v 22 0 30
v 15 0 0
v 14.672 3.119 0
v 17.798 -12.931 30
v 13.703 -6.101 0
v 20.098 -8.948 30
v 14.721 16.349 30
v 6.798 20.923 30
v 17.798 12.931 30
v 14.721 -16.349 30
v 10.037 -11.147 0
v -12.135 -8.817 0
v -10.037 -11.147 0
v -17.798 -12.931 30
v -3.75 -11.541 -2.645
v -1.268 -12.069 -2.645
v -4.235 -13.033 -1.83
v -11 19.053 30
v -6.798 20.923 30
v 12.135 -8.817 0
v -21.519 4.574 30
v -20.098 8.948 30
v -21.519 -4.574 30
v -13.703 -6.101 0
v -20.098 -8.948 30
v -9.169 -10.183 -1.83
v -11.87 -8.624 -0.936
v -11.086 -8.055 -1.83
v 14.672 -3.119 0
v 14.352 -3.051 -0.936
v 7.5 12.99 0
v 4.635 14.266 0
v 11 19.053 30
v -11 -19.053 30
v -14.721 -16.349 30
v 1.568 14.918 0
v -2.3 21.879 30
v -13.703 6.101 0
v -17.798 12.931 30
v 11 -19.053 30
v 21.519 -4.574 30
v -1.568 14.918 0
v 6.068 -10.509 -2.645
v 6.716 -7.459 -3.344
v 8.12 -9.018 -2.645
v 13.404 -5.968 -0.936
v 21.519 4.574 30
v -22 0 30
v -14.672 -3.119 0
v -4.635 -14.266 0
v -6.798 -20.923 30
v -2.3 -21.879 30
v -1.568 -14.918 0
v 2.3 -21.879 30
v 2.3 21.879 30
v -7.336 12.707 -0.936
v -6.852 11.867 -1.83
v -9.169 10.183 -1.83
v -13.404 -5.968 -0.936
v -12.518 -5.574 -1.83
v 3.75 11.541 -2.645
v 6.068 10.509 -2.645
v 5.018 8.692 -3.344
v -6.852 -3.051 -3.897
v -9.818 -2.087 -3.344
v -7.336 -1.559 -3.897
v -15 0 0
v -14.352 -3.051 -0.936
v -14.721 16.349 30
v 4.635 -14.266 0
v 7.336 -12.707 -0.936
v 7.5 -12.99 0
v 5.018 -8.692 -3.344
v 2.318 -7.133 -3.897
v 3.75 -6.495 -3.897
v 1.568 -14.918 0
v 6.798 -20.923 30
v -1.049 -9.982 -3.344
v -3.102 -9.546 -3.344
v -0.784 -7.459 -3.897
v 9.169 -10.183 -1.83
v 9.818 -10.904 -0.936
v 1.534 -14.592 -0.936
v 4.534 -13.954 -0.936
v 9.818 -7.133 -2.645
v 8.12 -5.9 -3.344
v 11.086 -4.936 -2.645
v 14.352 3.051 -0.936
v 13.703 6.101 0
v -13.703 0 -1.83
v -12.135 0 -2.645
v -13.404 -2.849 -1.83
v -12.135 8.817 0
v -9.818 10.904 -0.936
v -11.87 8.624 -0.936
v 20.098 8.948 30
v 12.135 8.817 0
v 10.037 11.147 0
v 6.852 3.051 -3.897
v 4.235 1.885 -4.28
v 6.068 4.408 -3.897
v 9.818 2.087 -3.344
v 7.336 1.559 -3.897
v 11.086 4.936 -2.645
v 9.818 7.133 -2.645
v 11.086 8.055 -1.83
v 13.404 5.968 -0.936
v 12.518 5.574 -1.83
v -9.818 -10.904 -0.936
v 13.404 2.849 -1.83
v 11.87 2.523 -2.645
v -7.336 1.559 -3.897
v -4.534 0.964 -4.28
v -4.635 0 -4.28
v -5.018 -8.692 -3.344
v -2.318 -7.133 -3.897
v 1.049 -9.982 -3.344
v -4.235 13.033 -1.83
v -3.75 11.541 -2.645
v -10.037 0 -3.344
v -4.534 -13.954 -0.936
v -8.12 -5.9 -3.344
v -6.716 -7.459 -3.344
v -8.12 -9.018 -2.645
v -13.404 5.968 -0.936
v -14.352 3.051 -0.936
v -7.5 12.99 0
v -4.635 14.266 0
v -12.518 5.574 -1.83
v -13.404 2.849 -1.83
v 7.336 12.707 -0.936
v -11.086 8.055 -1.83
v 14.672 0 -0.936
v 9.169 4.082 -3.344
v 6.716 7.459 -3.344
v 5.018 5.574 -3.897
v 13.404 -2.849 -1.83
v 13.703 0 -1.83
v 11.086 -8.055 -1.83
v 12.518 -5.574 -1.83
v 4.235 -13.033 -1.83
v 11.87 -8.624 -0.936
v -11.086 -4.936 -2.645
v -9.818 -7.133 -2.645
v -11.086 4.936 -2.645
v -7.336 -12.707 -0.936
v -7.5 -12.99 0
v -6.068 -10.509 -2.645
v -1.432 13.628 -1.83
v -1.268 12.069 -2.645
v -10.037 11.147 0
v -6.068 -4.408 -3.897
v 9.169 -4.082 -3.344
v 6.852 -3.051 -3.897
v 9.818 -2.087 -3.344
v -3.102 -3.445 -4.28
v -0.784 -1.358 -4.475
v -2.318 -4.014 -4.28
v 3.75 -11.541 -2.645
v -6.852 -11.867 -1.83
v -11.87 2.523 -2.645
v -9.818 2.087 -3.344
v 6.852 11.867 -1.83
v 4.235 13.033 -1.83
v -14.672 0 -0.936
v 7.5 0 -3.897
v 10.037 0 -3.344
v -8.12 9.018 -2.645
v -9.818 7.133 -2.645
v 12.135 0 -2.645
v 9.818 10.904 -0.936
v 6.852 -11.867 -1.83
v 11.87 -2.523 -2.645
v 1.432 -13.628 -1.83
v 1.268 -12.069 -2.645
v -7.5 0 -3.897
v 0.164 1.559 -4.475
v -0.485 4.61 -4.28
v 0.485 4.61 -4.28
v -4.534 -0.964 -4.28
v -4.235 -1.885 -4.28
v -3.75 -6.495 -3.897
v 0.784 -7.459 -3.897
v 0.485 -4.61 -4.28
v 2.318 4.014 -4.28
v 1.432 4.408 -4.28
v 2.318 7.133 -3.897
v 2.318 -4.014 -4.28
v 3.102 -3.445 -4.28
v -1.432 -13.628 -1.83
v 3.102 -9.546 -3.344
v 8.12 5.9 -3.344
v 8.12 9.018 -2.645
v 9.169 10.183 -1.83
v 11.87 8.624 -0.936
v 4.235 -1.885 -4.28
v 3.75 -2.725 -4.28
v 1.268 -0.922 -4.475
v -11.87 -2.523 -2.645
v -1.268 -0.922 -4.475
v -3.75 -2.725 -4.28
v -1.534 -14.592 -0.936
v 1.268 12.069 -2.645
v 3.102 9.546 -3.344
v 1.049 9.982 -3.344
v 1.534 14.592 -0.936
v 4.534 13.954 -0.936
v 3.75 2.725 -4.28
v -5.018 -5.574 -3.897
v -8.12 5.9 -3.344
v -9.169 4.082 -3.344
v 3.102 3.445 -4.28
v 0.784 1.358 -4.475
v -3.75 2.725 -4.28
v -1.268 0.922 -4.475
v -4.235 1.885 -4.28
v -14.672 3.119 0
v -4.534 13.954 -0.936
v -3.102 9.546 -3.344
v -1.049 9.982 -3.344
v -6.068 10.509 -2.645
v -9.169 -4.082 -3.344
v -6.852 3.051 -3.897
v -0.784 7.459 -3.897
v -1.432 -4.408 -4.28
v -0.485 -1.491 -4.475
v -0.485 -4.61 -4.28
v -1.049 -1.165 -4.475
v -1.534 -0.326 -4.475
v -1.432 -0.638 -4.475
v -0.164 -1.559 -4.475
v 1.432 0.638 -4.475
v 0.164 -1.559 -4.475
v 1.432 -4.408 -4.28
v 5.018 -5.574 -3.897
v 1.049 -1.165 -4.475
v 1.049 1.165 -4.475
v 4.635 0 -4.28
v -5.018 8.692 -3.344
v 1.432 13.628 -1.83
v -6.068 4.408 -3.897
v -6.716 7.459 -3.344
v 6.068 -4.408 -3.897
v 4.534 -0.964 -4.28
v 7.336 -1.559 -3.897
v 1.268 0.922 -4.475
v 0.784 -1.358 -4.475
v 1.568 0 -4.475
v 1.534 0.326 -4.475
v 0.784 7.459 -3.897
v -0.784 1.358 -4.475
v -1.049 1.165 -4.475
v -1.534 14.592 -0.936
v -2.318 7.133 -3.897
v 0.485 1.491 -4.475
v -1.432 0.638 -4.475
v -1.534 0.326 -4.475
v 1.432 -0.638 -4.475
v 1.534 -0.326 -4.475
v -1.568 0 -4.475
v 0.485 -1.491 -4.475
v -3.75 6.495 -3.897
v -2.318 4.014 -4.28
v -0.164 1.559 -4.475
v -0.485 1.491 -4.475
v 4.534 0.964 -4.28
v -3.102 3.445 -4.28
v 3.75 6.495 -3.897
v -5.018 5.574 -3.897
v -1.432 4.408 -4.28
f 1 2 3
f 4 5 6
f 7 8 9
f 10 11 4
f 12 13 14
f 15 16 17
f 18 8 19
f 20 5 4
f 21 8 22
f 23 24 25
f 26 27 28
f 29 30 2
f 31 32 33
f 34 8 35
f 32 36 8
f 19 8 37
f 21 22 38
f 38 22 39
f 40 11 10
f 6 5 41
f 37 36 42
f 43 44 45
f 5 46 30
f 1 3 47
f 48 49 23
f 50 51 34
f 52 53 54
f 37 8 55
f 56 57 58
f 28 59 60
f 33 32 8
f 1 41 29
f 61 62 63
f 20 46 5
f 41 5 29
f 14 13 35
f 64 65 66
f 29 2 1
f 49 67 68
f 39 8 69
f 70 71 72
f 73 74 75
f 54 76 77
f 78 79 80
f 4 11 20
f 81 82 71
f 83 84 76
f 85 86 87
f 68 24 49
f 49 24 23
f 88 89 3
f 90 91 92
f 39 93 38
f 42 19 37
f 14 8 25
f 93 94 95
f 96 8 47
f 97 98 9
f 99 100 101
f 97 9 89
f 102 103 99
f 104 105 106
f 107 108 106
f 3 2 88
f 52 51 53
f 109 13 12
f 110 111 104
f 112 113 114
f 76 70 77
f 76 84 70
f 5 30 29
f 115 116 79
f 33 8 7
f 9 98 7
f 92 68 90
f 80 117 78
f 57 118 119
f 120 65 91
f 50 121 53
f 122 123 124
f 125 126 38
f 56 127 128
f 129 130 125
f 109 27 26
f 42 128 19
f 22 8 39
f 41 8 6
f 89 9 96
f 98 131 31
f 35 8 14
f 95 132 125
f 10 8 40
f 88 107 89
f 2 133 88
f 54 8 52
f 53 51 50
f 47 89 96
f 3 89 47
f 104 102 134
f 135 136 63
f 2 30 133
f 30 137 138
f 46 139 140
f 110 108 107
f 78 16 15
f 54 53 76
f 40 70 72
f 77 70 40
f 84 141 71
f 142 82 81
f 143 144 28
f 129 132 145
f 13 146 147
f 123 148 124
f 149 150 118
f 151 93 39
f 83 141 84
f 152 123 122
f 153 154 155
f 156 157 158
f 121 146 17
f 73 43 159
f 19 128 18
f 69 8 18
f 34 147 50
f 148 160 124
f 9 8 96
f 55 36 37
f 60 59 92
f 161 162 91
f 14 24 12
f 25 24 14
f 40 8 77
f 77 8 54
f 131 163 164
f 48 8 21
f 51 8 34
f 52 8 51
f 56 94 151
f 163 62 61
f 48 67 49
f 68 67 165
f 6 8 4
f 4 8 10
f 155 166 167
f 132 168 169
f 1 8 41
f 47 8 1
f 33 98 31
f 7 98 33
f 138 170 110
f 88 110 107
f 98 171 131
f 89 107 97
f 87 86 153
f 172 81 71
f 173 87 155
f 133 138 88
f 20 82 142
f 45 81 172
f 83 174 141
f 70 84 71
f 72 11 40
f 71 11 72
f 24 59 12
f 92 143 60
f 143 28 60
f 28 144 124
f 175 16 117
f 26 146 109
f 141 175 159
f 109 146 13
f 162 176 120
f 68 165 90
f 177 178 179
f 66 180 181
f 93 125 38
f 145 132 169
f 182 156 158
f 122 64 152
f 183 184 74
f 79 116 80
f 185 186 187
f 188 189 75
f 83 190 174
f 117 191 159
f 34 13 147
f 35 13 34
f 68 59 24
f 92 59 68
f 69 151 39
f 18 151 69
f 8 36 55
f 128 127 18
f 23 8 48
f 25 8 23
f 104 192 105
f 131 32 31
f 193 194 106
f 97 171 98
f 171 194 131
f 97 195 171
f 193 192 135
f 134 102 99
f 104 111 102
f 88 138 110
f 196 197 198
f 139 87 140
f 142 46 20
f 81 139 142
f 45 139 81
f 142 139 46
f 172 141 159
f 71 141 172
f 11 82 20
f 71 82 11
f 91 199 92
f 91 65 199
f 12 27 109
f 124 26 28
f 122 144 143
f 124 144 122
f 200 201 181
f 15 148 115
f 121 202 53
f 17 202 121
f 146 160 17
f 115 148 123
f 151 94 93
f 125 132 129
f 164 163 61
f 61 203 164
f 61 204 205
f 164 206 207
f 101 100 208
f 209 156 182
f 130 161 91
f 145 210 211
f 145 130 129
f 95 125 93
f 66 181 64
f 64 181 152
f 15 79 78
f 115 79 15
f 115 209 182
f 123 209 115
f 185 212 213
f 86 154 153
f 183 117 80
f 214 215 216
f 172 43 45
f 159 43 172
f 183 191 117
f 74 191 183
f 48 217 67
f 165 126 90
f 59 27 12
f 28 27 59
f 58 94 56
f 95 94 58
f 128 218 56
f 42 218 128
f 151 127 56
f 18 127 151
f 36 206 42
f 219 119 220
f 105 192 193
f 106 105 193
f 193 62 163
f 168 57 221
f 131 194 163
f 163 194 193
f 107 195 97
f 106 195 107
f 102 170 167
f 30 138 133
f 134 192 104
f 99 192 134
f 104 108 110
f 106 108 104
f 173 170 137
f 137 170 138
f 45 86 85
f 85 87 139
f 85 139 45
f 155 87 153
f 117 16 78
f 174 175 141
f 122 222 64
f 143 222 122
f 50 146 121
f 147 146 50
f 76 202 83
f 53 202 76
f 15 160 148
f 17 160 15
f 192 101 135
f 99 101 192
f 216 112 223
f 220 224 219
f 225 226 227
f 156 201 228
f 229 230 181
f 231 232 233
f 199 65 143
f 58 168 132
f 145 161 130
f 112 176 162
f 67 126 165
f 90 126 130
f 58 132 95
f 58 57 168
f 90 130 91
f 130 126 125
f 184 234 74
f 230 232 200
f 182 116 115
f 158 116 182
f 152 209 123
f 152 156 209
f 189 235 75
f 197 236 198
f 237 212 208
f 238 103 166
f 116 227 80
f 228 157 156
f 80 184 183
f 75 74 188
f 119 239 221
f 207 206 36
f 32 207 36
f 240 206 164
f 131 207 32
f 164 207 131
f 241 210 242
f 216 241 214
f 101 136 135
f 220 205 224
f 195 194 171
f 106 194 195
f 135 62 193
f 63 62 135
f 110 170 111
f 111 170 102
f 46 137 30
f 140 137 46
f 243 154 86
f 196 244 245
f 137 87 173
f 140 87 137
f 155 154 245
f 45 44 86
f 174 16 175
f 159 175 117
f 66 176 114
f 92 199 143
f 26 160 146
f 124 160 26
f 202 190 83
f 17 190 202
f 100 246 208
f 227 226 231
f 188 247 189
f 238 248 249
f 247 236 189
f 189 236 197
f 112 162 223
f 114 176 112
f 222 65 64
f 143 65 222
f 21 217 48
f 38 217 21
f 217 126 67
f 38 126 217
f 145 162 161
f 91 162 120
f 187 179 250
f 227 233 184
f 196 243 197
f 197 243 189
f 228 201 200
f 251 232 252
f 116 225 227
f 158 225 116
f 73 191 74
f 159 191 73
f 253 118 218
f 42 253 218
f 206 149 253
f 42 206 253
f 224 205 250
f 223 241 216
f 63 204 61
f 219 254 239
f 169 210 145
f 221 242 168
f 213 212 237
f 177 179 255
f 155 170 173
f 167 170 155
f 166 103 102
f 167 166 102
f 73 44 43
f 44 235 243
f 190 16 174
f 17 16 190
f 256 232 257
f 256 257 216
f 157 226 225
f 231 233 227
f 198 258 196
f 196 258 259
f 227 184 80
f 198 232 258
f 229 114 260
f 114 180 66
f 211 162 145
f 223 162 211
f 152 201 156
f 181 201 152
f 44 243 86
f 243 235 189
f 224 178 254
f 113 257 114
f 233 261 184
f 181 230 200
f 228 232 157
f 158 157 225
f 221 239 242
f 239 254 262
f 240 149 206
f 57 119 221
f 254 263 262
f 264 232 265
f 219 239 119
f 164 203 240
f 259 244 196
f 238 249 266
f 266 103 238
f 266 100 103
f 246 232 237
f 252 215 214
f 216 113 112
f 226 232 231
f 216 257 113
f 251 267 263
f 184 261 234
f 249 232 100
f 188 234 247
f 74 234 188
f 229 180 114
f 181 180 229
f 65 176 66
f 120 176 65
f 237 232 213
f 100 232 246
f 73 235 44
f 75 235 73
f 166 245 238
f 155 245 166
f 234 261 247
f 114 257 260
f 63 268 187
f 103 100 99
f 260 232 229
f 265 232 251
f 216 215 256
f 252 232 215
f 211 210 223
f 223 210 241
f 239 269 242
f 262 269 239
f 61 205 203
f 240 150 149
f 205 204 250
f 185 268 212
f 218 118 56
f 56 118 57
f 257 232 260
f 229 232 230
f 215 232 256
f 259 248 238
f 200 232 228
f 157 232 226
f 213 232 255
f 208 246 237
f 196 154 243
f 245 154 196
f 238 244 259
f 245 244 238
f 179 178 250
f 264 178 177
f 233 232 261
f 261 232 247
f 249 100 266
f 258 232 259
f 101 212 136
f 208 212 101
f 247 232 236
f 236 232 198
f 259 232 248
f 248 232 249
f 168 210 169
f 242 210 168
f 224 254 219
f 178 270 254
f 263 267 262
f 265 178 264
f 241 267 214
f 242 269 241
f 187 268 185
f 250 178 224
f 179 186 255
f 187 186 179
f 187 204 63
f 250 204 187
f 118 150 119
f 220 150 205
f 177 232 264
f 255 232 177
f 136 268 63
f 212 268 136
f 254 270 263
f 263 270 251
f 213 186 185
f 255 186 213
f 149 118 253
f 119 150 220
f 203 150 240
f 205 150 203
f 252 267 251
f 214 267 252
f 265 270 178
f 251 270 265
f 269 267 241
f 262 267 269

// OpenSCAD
// thing 261118's lamp: a cone under a squashed dome. The cone's circles stay round when the squash
// is undone, so the pre-image is a solid of revolution — built exactly, stretched back.
hull() {
  cylinder(r1 = 11, r2 = 22, h = 30);
  scale([1, 1, 0.3]) sphere(r = 15);
}
